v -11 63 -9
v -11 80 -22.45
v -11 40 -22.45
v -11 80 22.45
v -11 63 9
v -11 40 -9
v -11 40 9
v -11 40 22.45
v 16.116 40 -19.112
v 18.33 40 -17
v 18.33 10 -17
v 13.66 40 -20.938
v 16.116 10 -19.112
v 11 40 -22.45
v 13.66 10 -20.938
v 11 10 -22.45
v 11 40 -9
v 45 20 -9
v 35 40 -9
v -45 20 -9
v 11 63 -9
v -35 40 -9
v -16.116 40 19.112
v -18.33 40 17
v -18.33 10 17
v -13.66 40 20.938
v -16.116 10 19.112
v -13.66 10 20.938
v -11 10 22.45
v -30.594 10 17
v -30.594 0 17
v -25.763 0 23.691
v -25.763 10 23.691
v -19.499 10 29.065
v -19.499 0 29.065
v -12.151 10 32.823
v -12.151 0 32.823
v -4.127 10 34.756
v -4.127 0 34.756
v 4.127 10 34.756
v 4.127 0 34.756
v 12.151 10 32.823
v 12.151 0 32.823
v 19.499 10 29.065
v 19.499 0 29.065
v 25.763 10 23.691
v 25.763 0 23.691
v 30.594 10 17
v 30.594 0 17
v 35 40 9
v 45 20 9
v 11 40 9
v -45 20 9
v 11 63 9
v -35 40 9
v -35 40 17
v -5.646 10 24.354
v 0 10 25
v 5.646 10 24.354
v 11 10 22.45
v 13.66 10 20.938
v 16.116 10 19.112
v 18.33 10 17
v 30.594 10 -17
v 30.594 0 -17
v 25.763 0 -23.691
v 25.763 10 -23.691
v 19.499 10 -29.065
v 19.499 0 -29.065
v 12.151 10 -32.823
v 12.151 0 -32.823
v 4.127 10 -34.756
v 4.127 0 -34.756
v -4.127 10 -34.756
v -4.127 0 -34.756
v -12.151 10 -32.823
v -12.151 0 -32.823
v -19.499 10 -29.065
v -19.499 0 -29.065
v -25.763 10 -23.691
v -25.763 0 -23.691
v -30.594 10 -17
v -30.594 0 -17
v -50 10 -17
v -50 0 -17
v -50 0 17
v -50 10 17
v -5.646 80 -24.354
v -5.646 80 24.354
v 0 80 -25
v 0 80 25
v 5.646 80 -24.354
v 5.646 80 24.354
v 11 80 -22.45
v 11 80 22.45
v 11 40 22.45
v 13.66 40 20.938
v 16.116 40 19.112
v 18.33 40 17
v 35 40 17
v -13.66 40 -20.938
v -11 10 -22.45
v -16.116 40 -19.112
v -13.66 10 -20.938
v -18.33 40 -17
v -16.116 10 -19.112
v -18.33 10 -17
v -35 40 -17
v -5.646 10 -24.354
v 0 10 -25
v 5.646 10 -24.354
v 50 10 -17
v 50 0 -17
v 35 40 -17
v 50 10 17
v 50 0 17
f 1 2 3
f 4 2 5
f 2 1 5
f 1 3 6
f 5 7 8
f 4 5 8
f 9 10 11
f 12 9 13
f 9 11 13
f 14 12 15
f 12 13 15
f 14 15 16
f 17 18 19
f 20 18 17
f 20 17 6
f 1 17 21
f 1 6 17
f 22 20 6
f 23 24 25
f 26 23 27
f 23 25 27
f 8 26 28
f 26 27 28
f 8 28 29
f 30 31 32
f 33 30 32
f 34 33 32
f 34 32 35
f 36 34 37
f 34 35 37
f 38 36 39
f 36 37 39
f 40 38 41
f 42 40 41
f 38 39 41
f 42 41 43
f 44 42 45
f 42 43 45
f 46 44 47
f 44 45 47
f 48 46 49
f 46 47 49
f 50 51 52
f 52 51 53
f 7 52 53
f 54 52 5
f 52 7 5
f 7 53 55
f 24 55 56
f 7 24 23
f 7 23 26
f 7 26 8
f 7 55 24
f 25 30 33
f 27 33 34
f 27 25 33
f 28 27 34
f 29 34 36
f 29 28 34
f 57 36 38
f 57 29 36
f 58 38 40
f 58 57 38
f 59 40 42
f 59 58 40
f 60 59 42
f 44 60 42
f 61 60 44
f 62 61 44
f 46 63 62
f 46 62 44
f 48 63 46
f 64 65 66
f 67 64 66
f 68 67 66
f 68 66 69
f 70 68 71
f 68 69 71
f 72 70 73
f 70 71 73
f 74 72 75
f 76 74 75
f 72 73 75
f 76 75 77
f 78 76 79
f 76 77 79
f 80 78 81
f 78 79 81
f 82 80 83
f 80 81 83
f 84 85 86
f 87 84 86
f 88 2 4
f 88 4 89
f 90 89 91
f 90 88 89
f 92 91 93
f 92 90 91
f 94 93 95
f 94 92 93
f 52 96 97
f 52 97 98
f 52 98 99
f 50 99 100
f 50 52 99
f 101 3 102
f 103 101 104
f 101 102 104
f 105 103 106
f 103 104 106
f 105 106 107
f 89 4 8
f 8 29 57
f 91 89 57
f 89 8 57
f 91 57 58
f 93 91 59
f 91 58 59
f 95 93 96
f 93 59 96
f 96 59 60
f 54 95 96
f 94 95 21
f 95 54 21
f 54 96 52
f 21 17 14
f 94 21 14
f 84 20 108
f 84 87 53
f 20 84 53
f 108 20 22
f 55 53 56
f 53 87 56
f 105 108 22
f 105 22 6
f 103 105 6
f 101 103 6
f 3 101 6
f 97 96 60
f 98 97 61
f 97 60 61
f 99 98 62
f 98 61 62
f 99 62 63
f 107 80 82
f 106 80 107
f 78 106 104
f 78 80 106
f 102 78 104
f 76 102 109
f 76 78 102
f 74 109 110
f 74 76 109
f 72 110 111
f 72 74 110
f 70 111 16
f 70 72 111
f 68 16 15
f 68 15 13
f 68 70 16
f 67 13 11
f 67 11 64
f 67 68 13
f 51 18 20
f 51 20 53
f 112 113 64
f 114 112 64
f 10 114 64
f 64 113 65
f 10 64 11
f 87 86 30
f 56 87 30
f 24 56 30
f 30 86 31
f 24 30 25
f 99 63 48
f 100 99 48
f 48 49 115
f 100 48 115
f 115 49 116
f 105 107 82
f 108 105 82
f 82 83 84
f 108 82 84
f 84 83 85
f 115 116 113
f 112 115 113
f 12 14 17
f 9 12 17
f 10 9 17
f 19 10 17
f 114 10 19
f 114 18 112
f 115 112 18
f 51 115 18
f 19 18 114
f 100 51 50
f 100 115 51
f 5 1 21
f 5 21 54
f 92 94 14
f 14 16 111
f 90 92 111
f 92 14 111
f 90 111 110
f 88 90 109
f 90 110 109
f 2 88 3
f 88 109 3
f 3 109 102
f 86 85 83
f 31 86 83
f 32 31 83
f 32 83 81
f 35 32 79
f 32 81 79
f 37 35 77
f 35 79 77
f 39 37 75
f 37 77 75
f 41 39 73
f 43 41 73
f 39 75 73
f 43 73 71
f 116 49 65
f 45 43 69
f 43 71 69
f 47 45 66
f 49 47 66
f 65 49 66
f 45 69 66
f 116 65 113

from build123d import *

# Parameters (mm, degrees)
BOSS_EXTRUDE2_DEPTH = 80
BOSS_EXTRUDE3_DEPTH = 10
BOSS_EXTRUDE4_DEPTH = 40
CUT_EXTRUDE1_DEPTH  = 108.721864076
SKETCH3_W           = 18
SKETCH3_H           = 43
CUT_EXTRUDE2_DEPTH  = 133.759180474


with BuildPart() as part:
    # Sketch1 → Boss-Extrude2 (new body)
    with BuildSketch(Plane(origin=(0, 0, 0), x_dir=(1, 0, 0), z_dir=(0, 1, 0))):
        with BuildLine():
            Line((11, 17), (11, 22.449944321))
            ThreePointArc((11, 22.449944321), (0, 25), (-11, 22.449944321))
            Line((-11, 22.449944321), (-11, 17))
            Line((-11, 17), (-11, 9))
            Line((-11, 9), (-11, -9))
            Line((-11, -9), (-11, -17))
            Line((-11, -17), (-11, -22.449944321))
            ThreePointArc((-11, -22.449944321), (0, -25), (11, -22.449944321))
            Line((11, -22.449944321), (11, -17))
            Line((11, -17), (11, -9))
            Line((11, -9), (11, 9))
            Line((11, 9), (11, 17))
        make_face()
    extrude(amount=BOSS_EXTRUDE2_DEPTH)

    # Sketch1<6> → Boss-Extrude3 (add)
    with BuildSketch(Plane(origin=(0, 0, 0), x_dir=(1, 0, 0), z_dir=(0, 1, 0))):
        with BuildLine():
            ThreePointArc((-18.33030278, 17), (0, 25), (18.33030278, 17))
            Line((18.33030278, 17), (30.594117082, 17))
            ThreePointArc((30.594117082, 17), (0, 35), (-30.594117082, 17))
            Line((-30.594117082, 17), (-18.33030278, 17))
        make_face()
        with BuildLine():
            ThreePointArc((18.33030278, -17), (0, -25), (-18.33030278, -17))
            Line((-18.33030278, -17), (-30.594117082, -17))
            ThreePointArc((-30.594117082, -17), (0, -35), (30.594117082, -17))
            Line((30.594117082, -17), (18.33030278, -17))
        make_face()
    extrude(amount=BOSS_EXTRUDE3_DEPTH)

    # Sketch1<9> → Boss-Extrude4 (add)
    with BuildSketch(Plane(origin=(0, 0, 0), x_dir=(1, 0, 0), z_dir=(0, 1, 0))):
        with BuildLine():
            ThreePointArc((18.33030278, 17), (14.916170372, 20.062598571), (11, 22.449944321))
            Line((11, 22.449944321), (11, -22.449944321))
            ThreePointArc((11, -22.449944321), (14.916170372, -20.062598571), (18.33030278, -17))
            Line((18.33030278, -17), (50, -17))
            Line((50, -17), (50, 17))
            Line((50, 17), (18.33030278, 17))
        make_face()
        with BuildLine():
            ThreePointArc((-11, 22.449944321), (-14.916170372, 20.062598571), (-18.33030278, 17))
            Line((-18.33030278, 17), (-50, 17))
            Line((-50, 17), (-50, -17))
            Line((-50, -17), (-18.33030278, -17))
            ThreePointArc((-18.33030278, -17), (-14.916170372, -20.062598571), (-11, -22.449944321))
            Line((-11, -22.449944321), (-11, 22.449944321))
        make_face()
    extrude(amount=BOSS_EXTRUDE4_DEPTH)

    # Sketch2 → Cut-Extrude1 (cut, through all)
    with BuildSketch(Plane.XY.offset(17)):
        Polygon((-50, 10), (-35, 40), (-50, 40), align=None)
        Polygon((50, 10), (35, 40), (50, 40), align=None)
    extrude(amount=-CUT_EXTRUDE1_DEPTH, mode=Mode.SUBTRACT)

    # Sketch3 → Cut-Extrude2 (cut, through all)
    with BuildSketch(Plane.ZY.offset(50)):
        with Locations((0, 41.5)):
            Rectangle(SKETCH3_W, SKETCH3_H)
    extrude(amount=-CUT_EXTRUDE2_DEPTH, mode=Mode.SUBTRACT)


solid = part.part
